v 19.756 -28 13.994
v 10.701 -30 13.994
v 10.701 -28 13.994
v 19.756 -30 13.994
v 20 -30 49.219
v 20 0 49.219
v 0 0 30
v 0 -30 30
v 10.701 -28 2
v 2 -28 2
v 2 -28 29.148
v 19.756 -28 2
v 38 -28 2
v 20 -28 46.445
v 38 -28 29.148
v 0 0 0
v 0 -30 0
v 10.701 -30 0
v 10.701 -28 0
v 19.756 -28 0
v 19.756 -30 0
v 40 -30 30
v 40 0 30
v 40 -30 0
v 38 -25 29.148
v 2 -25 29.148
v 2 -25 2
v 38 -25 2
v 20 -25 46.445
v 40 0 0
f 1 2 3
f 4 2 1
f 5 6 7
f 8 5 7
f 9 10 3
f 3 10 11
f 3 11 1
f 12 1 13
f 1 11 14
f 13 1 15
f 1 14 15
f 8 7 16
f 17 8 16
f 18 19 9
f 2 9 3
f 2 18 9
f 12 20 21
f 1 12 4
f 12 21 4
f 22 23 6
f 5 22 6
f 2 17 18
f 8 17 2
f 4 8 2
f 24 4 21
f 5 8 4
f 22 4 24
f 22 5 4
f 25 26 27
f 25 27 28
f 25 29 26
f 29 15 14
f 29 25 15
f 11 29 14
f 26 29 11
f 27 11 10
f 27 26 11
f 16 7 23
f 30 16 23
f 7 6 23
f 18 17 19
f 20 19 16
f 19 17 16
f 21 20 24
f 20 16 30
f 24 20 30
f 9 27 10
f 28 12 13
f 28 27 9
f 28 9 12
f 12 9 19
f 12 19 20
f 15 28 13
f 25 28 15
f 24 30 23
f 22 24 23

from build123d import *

# Parameters (mm, degrees)
F1_DEPTH = 30
F2_T     = -2
F3_W     = 9.0548824519
F3_H     = 13.9939039946
F4_DEPTH = 2
F5_DEPTH = 25


with BuildPart() as f1:
    # F0 (on Front) → F1 (new body)
    with BuildSketch(Plane.XZ):
        Polygon((0, 30), (0, 0), (40, 0), (40, 30), (20, 49.2188770223), align=None)
    extrude(amount=F1_DEPTH)

    # F2 (hollow: no face is removed)
    offset(amount=F2_T, mode=Mode.SUBTRACT)

    # F3 (on face) → F4 (cut)
    with BuildSketch(Plane.XZ.offset(30)):
        with Locations((15.2286598459, 6.9969519973)):
            Rectangle(F3_W, F3_H)
    extrude(amount=-F4_DEPTH, mode=Mode.SUBTRACT)

    # F0 (on Front) → F5 (join)
    with BuildSketch(Plane.XZ):
        Polygon((0, 30), (0, 0), (40, 0), (40, 30), (20, 49.2188770223), align=None)
    extrude(amount=F5_DEPTH)


solid = f1.part
